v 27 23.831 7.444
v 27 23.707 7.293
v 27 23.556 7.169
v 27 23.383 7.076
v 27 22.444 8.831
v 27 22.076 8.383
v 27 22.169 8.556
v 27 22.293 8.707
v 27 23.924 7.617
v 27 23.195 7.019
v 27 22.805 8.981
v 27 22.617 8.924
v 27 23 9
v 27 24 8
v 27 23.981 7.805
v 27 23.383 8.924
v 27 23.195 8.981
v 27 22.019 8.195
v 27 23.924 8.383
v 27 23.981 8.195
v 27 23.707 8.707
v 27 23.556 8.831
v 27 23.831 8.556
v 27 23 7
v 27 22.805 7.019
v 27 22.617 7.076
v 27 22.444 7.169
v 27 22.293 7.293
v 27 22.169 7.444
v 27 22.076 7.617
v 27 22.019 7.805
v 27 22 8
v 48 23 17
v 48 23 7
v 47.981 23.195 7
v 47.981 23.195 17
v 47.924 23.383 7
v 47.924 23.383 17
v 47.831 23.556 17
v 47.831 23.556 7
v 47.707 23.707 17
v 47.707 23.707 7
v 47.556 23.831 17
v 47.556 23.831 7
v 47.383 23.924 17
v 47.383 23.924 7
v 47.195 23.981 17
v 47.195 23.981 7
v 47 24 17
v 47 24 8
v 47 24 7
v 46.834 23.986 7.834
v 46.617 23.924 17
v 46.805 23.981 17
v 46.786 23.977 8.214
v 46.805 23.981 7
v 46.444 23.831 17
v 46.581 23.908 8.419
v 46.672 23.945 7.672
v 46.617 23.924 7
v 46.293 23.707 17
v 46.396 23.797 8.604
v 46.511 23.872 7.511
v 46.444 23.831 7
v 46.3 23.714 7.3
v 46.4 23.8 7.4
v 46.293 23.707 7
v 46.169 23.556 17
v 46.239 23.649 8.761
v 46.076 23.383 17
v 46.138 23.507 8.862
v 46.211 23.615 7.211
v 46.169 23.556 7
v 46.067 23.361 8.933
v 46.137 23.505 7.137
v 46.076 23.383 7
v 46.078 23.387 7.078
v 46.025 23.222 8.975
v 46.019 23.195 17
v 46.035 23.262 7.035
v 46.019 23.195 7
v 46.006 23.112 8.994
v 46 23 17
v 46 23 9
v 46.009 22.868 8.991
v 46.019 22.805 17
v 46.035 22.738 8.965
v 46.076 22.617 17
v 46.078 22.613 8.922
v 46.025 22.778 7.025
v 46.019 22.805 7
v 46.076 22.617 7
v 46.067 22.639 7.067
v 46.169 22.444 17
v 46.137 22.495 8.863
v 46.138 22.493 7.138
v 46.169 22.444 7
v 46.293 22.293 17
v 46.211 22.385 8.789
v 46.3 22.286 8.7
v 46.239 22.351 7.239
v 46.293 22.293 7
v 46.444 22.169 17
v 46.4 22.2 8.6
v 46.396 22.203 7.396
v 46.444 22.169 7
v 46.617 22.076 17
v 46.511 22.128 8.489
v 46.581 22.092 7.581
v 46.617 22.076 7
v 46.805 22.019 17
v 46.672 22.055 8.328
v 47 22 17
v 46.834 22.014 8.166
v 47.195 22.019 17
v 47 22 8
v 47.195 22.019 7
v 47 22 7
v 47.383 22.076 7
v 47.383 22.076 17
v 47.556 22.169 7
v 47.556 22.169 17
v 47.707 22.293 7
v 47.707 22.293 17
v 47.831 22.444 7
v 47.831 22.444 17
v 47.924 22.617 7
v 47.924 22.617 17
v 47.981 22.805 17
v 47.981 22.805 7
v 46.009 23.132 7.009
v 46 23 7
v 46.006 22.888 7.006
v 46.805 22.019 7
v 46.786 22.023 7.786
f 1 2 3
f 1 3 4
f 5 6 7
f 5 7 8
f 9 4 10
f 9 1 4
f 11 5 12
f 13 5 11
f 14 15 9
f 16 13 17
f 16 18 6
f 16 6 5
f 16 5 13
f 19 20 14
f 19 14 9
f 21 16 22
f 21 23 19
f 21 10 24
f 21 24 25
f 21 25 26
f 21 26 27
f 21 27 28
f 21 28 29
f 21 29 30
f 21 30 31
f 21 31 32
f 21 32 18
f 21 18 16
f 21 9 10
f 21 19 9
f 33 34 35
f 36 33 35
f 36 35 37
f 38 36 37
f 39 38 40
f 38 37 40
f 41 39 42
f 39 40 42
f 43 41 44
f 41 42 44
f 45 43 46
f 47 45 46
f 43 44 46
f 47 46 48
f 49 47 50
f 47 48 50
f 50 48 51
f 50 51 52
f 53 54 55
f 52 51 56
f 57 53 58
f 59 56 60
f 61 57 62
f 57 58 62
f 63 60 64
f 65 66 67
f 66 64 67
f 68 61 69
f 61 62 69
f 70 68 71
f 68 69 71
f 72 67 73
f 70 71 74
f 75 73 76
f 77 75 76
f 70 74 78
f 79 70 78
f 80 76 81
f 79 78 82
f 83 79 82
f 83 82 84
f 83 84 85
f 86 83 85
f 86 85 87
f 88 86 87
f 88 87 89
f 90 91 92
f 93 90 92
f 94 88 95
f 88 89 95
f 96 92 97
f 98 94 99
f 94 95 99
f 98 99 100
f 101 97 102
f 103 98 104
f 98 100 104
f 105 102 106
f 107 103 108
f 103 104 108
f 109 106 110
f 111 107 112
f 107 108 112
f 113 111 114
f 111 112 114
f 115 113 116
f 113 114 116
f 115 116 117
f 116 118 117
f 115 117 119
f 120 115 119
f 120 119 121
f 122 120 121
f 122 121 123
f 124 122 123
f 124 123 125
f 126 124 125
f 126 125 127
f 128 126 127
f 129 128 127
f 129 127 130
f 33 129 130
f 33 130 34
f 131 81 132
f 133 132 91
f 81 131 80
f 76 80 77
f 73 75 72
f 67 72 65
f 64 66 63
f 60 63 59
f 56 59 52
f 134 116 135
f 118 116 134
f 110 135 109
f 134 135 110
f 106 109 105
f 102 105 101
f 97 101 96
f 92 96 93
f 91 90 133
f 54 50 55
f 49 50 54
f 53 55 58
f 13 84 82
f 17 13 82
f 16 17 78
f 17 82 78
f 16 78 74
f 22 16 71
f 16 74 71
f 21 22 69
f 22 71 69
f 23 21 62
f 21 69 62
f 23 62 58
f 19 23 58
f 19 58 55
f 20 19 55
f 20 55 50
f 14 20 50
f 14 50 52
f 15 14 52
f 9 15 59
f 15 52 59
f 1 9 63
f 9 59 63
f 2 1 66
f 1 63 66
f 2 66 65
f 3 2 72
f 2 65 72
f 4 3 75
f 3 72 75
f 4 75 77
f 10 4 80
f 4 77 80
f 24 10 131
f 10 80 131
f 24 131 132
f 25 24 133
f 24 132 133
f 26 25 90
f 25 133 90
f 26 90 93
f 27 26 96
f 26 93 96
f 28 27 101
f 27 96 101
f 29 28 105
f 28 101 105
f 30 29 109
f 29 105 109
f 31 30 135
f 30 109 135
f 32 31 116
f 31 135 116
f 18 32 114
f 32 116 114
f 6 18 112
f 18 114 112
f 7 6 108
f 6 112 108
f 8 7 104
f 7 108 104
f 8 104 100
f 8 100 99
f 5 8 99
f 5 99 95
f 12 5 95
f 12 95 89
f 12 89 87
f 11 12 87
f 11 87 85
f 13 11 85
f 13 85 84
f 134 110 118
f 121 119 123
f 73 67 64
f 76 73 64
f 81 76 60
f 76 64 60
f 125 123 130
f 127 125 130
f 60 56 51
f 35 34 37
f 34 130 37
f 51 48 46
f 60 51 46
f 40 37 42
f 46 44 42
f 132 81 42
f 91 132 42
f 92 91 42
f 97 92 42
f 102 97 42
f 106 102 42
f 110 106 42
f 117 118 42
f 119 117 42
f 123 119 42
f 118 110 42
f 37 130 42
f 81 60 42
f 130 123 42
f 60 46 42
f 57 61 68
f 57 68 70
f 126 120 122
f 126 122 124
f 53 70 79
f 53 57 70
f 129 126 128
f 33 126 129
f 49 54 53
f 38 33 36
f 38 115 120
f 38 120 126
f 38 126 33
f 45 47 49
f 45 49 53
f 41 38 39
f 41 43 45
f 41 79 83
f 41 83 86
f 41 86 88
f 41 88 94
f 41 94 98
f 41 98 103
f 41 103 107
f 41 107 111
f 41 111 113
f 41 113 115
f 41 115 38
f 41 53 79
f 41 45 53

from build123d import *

# Parameters (mm, degrees)
BOX064_W          = 10
BOX064_H          = 10
BOX064_DEPTH      = 10
CYLINDER002_R     = 1
CYLINDER002_DEPTH = 9
CYLINDER001_R     = 1
CYLINDER001_DEPTH = 21
CYLINDER003_R     = 1
CYLINDER003_DEPTH = 10


with BuildPart() as box064:
    # Box064 → Box064 (new body)
    with BuildSketch(Plane(origin=(47, 14, 0), x_dir=(1, 0, 0), z_dir=(0, 0, 1))):
        with Locations((5, 5)):
            Rectangle(BOX064_W, BOX064_H)
    extrude(amount=BOX064_DEPTH)


with BuildPart() as cylinder002:
    # Cylinder002 → Cylinder002 (new body)
    with BuildSketch(Plane(origin=(47, 23, 7), x_dir=(1, 0, 0), z_dir=(0, 0, 1))):
        Circle(CYLINDER002_R)
    extrude(amount=CYLINDER002_DEPTH)


with BuildPart() as cut022:
    # Cylinder001 → Cylinder001 (new body)
    with BuildSketch(Plane(origin=(48, 23, 8), x_dir=(0, 0, 1), z_dir=(-1, 0, 0))):
        Circle(CYLINDER001_R)
    extrude(amount=CYLINDER001_DEPTH)

    # Cut021: cut Cylinder002
    add(cylinder002.part, mode=Mode.SUBTRACT)

    # Cut022: cut Box064
    add(box064.part, mode=Mode.SUBTRACT)


with BuildPart() as fusion025:
    # Cylinder003 → Cylinder003 (new body)
    with BuildSketch(Plane(origin=(47, 23, 7), x_dir=(1, 0, 0), z_dir=(0, 0, 1))):
        Circle(CYLINDER003_R)
    extrude(amount=CYLINDER003_DEPTH)

    # Fusion025: union Cut022
    add(cut022.part)


solid = fusion025.part
